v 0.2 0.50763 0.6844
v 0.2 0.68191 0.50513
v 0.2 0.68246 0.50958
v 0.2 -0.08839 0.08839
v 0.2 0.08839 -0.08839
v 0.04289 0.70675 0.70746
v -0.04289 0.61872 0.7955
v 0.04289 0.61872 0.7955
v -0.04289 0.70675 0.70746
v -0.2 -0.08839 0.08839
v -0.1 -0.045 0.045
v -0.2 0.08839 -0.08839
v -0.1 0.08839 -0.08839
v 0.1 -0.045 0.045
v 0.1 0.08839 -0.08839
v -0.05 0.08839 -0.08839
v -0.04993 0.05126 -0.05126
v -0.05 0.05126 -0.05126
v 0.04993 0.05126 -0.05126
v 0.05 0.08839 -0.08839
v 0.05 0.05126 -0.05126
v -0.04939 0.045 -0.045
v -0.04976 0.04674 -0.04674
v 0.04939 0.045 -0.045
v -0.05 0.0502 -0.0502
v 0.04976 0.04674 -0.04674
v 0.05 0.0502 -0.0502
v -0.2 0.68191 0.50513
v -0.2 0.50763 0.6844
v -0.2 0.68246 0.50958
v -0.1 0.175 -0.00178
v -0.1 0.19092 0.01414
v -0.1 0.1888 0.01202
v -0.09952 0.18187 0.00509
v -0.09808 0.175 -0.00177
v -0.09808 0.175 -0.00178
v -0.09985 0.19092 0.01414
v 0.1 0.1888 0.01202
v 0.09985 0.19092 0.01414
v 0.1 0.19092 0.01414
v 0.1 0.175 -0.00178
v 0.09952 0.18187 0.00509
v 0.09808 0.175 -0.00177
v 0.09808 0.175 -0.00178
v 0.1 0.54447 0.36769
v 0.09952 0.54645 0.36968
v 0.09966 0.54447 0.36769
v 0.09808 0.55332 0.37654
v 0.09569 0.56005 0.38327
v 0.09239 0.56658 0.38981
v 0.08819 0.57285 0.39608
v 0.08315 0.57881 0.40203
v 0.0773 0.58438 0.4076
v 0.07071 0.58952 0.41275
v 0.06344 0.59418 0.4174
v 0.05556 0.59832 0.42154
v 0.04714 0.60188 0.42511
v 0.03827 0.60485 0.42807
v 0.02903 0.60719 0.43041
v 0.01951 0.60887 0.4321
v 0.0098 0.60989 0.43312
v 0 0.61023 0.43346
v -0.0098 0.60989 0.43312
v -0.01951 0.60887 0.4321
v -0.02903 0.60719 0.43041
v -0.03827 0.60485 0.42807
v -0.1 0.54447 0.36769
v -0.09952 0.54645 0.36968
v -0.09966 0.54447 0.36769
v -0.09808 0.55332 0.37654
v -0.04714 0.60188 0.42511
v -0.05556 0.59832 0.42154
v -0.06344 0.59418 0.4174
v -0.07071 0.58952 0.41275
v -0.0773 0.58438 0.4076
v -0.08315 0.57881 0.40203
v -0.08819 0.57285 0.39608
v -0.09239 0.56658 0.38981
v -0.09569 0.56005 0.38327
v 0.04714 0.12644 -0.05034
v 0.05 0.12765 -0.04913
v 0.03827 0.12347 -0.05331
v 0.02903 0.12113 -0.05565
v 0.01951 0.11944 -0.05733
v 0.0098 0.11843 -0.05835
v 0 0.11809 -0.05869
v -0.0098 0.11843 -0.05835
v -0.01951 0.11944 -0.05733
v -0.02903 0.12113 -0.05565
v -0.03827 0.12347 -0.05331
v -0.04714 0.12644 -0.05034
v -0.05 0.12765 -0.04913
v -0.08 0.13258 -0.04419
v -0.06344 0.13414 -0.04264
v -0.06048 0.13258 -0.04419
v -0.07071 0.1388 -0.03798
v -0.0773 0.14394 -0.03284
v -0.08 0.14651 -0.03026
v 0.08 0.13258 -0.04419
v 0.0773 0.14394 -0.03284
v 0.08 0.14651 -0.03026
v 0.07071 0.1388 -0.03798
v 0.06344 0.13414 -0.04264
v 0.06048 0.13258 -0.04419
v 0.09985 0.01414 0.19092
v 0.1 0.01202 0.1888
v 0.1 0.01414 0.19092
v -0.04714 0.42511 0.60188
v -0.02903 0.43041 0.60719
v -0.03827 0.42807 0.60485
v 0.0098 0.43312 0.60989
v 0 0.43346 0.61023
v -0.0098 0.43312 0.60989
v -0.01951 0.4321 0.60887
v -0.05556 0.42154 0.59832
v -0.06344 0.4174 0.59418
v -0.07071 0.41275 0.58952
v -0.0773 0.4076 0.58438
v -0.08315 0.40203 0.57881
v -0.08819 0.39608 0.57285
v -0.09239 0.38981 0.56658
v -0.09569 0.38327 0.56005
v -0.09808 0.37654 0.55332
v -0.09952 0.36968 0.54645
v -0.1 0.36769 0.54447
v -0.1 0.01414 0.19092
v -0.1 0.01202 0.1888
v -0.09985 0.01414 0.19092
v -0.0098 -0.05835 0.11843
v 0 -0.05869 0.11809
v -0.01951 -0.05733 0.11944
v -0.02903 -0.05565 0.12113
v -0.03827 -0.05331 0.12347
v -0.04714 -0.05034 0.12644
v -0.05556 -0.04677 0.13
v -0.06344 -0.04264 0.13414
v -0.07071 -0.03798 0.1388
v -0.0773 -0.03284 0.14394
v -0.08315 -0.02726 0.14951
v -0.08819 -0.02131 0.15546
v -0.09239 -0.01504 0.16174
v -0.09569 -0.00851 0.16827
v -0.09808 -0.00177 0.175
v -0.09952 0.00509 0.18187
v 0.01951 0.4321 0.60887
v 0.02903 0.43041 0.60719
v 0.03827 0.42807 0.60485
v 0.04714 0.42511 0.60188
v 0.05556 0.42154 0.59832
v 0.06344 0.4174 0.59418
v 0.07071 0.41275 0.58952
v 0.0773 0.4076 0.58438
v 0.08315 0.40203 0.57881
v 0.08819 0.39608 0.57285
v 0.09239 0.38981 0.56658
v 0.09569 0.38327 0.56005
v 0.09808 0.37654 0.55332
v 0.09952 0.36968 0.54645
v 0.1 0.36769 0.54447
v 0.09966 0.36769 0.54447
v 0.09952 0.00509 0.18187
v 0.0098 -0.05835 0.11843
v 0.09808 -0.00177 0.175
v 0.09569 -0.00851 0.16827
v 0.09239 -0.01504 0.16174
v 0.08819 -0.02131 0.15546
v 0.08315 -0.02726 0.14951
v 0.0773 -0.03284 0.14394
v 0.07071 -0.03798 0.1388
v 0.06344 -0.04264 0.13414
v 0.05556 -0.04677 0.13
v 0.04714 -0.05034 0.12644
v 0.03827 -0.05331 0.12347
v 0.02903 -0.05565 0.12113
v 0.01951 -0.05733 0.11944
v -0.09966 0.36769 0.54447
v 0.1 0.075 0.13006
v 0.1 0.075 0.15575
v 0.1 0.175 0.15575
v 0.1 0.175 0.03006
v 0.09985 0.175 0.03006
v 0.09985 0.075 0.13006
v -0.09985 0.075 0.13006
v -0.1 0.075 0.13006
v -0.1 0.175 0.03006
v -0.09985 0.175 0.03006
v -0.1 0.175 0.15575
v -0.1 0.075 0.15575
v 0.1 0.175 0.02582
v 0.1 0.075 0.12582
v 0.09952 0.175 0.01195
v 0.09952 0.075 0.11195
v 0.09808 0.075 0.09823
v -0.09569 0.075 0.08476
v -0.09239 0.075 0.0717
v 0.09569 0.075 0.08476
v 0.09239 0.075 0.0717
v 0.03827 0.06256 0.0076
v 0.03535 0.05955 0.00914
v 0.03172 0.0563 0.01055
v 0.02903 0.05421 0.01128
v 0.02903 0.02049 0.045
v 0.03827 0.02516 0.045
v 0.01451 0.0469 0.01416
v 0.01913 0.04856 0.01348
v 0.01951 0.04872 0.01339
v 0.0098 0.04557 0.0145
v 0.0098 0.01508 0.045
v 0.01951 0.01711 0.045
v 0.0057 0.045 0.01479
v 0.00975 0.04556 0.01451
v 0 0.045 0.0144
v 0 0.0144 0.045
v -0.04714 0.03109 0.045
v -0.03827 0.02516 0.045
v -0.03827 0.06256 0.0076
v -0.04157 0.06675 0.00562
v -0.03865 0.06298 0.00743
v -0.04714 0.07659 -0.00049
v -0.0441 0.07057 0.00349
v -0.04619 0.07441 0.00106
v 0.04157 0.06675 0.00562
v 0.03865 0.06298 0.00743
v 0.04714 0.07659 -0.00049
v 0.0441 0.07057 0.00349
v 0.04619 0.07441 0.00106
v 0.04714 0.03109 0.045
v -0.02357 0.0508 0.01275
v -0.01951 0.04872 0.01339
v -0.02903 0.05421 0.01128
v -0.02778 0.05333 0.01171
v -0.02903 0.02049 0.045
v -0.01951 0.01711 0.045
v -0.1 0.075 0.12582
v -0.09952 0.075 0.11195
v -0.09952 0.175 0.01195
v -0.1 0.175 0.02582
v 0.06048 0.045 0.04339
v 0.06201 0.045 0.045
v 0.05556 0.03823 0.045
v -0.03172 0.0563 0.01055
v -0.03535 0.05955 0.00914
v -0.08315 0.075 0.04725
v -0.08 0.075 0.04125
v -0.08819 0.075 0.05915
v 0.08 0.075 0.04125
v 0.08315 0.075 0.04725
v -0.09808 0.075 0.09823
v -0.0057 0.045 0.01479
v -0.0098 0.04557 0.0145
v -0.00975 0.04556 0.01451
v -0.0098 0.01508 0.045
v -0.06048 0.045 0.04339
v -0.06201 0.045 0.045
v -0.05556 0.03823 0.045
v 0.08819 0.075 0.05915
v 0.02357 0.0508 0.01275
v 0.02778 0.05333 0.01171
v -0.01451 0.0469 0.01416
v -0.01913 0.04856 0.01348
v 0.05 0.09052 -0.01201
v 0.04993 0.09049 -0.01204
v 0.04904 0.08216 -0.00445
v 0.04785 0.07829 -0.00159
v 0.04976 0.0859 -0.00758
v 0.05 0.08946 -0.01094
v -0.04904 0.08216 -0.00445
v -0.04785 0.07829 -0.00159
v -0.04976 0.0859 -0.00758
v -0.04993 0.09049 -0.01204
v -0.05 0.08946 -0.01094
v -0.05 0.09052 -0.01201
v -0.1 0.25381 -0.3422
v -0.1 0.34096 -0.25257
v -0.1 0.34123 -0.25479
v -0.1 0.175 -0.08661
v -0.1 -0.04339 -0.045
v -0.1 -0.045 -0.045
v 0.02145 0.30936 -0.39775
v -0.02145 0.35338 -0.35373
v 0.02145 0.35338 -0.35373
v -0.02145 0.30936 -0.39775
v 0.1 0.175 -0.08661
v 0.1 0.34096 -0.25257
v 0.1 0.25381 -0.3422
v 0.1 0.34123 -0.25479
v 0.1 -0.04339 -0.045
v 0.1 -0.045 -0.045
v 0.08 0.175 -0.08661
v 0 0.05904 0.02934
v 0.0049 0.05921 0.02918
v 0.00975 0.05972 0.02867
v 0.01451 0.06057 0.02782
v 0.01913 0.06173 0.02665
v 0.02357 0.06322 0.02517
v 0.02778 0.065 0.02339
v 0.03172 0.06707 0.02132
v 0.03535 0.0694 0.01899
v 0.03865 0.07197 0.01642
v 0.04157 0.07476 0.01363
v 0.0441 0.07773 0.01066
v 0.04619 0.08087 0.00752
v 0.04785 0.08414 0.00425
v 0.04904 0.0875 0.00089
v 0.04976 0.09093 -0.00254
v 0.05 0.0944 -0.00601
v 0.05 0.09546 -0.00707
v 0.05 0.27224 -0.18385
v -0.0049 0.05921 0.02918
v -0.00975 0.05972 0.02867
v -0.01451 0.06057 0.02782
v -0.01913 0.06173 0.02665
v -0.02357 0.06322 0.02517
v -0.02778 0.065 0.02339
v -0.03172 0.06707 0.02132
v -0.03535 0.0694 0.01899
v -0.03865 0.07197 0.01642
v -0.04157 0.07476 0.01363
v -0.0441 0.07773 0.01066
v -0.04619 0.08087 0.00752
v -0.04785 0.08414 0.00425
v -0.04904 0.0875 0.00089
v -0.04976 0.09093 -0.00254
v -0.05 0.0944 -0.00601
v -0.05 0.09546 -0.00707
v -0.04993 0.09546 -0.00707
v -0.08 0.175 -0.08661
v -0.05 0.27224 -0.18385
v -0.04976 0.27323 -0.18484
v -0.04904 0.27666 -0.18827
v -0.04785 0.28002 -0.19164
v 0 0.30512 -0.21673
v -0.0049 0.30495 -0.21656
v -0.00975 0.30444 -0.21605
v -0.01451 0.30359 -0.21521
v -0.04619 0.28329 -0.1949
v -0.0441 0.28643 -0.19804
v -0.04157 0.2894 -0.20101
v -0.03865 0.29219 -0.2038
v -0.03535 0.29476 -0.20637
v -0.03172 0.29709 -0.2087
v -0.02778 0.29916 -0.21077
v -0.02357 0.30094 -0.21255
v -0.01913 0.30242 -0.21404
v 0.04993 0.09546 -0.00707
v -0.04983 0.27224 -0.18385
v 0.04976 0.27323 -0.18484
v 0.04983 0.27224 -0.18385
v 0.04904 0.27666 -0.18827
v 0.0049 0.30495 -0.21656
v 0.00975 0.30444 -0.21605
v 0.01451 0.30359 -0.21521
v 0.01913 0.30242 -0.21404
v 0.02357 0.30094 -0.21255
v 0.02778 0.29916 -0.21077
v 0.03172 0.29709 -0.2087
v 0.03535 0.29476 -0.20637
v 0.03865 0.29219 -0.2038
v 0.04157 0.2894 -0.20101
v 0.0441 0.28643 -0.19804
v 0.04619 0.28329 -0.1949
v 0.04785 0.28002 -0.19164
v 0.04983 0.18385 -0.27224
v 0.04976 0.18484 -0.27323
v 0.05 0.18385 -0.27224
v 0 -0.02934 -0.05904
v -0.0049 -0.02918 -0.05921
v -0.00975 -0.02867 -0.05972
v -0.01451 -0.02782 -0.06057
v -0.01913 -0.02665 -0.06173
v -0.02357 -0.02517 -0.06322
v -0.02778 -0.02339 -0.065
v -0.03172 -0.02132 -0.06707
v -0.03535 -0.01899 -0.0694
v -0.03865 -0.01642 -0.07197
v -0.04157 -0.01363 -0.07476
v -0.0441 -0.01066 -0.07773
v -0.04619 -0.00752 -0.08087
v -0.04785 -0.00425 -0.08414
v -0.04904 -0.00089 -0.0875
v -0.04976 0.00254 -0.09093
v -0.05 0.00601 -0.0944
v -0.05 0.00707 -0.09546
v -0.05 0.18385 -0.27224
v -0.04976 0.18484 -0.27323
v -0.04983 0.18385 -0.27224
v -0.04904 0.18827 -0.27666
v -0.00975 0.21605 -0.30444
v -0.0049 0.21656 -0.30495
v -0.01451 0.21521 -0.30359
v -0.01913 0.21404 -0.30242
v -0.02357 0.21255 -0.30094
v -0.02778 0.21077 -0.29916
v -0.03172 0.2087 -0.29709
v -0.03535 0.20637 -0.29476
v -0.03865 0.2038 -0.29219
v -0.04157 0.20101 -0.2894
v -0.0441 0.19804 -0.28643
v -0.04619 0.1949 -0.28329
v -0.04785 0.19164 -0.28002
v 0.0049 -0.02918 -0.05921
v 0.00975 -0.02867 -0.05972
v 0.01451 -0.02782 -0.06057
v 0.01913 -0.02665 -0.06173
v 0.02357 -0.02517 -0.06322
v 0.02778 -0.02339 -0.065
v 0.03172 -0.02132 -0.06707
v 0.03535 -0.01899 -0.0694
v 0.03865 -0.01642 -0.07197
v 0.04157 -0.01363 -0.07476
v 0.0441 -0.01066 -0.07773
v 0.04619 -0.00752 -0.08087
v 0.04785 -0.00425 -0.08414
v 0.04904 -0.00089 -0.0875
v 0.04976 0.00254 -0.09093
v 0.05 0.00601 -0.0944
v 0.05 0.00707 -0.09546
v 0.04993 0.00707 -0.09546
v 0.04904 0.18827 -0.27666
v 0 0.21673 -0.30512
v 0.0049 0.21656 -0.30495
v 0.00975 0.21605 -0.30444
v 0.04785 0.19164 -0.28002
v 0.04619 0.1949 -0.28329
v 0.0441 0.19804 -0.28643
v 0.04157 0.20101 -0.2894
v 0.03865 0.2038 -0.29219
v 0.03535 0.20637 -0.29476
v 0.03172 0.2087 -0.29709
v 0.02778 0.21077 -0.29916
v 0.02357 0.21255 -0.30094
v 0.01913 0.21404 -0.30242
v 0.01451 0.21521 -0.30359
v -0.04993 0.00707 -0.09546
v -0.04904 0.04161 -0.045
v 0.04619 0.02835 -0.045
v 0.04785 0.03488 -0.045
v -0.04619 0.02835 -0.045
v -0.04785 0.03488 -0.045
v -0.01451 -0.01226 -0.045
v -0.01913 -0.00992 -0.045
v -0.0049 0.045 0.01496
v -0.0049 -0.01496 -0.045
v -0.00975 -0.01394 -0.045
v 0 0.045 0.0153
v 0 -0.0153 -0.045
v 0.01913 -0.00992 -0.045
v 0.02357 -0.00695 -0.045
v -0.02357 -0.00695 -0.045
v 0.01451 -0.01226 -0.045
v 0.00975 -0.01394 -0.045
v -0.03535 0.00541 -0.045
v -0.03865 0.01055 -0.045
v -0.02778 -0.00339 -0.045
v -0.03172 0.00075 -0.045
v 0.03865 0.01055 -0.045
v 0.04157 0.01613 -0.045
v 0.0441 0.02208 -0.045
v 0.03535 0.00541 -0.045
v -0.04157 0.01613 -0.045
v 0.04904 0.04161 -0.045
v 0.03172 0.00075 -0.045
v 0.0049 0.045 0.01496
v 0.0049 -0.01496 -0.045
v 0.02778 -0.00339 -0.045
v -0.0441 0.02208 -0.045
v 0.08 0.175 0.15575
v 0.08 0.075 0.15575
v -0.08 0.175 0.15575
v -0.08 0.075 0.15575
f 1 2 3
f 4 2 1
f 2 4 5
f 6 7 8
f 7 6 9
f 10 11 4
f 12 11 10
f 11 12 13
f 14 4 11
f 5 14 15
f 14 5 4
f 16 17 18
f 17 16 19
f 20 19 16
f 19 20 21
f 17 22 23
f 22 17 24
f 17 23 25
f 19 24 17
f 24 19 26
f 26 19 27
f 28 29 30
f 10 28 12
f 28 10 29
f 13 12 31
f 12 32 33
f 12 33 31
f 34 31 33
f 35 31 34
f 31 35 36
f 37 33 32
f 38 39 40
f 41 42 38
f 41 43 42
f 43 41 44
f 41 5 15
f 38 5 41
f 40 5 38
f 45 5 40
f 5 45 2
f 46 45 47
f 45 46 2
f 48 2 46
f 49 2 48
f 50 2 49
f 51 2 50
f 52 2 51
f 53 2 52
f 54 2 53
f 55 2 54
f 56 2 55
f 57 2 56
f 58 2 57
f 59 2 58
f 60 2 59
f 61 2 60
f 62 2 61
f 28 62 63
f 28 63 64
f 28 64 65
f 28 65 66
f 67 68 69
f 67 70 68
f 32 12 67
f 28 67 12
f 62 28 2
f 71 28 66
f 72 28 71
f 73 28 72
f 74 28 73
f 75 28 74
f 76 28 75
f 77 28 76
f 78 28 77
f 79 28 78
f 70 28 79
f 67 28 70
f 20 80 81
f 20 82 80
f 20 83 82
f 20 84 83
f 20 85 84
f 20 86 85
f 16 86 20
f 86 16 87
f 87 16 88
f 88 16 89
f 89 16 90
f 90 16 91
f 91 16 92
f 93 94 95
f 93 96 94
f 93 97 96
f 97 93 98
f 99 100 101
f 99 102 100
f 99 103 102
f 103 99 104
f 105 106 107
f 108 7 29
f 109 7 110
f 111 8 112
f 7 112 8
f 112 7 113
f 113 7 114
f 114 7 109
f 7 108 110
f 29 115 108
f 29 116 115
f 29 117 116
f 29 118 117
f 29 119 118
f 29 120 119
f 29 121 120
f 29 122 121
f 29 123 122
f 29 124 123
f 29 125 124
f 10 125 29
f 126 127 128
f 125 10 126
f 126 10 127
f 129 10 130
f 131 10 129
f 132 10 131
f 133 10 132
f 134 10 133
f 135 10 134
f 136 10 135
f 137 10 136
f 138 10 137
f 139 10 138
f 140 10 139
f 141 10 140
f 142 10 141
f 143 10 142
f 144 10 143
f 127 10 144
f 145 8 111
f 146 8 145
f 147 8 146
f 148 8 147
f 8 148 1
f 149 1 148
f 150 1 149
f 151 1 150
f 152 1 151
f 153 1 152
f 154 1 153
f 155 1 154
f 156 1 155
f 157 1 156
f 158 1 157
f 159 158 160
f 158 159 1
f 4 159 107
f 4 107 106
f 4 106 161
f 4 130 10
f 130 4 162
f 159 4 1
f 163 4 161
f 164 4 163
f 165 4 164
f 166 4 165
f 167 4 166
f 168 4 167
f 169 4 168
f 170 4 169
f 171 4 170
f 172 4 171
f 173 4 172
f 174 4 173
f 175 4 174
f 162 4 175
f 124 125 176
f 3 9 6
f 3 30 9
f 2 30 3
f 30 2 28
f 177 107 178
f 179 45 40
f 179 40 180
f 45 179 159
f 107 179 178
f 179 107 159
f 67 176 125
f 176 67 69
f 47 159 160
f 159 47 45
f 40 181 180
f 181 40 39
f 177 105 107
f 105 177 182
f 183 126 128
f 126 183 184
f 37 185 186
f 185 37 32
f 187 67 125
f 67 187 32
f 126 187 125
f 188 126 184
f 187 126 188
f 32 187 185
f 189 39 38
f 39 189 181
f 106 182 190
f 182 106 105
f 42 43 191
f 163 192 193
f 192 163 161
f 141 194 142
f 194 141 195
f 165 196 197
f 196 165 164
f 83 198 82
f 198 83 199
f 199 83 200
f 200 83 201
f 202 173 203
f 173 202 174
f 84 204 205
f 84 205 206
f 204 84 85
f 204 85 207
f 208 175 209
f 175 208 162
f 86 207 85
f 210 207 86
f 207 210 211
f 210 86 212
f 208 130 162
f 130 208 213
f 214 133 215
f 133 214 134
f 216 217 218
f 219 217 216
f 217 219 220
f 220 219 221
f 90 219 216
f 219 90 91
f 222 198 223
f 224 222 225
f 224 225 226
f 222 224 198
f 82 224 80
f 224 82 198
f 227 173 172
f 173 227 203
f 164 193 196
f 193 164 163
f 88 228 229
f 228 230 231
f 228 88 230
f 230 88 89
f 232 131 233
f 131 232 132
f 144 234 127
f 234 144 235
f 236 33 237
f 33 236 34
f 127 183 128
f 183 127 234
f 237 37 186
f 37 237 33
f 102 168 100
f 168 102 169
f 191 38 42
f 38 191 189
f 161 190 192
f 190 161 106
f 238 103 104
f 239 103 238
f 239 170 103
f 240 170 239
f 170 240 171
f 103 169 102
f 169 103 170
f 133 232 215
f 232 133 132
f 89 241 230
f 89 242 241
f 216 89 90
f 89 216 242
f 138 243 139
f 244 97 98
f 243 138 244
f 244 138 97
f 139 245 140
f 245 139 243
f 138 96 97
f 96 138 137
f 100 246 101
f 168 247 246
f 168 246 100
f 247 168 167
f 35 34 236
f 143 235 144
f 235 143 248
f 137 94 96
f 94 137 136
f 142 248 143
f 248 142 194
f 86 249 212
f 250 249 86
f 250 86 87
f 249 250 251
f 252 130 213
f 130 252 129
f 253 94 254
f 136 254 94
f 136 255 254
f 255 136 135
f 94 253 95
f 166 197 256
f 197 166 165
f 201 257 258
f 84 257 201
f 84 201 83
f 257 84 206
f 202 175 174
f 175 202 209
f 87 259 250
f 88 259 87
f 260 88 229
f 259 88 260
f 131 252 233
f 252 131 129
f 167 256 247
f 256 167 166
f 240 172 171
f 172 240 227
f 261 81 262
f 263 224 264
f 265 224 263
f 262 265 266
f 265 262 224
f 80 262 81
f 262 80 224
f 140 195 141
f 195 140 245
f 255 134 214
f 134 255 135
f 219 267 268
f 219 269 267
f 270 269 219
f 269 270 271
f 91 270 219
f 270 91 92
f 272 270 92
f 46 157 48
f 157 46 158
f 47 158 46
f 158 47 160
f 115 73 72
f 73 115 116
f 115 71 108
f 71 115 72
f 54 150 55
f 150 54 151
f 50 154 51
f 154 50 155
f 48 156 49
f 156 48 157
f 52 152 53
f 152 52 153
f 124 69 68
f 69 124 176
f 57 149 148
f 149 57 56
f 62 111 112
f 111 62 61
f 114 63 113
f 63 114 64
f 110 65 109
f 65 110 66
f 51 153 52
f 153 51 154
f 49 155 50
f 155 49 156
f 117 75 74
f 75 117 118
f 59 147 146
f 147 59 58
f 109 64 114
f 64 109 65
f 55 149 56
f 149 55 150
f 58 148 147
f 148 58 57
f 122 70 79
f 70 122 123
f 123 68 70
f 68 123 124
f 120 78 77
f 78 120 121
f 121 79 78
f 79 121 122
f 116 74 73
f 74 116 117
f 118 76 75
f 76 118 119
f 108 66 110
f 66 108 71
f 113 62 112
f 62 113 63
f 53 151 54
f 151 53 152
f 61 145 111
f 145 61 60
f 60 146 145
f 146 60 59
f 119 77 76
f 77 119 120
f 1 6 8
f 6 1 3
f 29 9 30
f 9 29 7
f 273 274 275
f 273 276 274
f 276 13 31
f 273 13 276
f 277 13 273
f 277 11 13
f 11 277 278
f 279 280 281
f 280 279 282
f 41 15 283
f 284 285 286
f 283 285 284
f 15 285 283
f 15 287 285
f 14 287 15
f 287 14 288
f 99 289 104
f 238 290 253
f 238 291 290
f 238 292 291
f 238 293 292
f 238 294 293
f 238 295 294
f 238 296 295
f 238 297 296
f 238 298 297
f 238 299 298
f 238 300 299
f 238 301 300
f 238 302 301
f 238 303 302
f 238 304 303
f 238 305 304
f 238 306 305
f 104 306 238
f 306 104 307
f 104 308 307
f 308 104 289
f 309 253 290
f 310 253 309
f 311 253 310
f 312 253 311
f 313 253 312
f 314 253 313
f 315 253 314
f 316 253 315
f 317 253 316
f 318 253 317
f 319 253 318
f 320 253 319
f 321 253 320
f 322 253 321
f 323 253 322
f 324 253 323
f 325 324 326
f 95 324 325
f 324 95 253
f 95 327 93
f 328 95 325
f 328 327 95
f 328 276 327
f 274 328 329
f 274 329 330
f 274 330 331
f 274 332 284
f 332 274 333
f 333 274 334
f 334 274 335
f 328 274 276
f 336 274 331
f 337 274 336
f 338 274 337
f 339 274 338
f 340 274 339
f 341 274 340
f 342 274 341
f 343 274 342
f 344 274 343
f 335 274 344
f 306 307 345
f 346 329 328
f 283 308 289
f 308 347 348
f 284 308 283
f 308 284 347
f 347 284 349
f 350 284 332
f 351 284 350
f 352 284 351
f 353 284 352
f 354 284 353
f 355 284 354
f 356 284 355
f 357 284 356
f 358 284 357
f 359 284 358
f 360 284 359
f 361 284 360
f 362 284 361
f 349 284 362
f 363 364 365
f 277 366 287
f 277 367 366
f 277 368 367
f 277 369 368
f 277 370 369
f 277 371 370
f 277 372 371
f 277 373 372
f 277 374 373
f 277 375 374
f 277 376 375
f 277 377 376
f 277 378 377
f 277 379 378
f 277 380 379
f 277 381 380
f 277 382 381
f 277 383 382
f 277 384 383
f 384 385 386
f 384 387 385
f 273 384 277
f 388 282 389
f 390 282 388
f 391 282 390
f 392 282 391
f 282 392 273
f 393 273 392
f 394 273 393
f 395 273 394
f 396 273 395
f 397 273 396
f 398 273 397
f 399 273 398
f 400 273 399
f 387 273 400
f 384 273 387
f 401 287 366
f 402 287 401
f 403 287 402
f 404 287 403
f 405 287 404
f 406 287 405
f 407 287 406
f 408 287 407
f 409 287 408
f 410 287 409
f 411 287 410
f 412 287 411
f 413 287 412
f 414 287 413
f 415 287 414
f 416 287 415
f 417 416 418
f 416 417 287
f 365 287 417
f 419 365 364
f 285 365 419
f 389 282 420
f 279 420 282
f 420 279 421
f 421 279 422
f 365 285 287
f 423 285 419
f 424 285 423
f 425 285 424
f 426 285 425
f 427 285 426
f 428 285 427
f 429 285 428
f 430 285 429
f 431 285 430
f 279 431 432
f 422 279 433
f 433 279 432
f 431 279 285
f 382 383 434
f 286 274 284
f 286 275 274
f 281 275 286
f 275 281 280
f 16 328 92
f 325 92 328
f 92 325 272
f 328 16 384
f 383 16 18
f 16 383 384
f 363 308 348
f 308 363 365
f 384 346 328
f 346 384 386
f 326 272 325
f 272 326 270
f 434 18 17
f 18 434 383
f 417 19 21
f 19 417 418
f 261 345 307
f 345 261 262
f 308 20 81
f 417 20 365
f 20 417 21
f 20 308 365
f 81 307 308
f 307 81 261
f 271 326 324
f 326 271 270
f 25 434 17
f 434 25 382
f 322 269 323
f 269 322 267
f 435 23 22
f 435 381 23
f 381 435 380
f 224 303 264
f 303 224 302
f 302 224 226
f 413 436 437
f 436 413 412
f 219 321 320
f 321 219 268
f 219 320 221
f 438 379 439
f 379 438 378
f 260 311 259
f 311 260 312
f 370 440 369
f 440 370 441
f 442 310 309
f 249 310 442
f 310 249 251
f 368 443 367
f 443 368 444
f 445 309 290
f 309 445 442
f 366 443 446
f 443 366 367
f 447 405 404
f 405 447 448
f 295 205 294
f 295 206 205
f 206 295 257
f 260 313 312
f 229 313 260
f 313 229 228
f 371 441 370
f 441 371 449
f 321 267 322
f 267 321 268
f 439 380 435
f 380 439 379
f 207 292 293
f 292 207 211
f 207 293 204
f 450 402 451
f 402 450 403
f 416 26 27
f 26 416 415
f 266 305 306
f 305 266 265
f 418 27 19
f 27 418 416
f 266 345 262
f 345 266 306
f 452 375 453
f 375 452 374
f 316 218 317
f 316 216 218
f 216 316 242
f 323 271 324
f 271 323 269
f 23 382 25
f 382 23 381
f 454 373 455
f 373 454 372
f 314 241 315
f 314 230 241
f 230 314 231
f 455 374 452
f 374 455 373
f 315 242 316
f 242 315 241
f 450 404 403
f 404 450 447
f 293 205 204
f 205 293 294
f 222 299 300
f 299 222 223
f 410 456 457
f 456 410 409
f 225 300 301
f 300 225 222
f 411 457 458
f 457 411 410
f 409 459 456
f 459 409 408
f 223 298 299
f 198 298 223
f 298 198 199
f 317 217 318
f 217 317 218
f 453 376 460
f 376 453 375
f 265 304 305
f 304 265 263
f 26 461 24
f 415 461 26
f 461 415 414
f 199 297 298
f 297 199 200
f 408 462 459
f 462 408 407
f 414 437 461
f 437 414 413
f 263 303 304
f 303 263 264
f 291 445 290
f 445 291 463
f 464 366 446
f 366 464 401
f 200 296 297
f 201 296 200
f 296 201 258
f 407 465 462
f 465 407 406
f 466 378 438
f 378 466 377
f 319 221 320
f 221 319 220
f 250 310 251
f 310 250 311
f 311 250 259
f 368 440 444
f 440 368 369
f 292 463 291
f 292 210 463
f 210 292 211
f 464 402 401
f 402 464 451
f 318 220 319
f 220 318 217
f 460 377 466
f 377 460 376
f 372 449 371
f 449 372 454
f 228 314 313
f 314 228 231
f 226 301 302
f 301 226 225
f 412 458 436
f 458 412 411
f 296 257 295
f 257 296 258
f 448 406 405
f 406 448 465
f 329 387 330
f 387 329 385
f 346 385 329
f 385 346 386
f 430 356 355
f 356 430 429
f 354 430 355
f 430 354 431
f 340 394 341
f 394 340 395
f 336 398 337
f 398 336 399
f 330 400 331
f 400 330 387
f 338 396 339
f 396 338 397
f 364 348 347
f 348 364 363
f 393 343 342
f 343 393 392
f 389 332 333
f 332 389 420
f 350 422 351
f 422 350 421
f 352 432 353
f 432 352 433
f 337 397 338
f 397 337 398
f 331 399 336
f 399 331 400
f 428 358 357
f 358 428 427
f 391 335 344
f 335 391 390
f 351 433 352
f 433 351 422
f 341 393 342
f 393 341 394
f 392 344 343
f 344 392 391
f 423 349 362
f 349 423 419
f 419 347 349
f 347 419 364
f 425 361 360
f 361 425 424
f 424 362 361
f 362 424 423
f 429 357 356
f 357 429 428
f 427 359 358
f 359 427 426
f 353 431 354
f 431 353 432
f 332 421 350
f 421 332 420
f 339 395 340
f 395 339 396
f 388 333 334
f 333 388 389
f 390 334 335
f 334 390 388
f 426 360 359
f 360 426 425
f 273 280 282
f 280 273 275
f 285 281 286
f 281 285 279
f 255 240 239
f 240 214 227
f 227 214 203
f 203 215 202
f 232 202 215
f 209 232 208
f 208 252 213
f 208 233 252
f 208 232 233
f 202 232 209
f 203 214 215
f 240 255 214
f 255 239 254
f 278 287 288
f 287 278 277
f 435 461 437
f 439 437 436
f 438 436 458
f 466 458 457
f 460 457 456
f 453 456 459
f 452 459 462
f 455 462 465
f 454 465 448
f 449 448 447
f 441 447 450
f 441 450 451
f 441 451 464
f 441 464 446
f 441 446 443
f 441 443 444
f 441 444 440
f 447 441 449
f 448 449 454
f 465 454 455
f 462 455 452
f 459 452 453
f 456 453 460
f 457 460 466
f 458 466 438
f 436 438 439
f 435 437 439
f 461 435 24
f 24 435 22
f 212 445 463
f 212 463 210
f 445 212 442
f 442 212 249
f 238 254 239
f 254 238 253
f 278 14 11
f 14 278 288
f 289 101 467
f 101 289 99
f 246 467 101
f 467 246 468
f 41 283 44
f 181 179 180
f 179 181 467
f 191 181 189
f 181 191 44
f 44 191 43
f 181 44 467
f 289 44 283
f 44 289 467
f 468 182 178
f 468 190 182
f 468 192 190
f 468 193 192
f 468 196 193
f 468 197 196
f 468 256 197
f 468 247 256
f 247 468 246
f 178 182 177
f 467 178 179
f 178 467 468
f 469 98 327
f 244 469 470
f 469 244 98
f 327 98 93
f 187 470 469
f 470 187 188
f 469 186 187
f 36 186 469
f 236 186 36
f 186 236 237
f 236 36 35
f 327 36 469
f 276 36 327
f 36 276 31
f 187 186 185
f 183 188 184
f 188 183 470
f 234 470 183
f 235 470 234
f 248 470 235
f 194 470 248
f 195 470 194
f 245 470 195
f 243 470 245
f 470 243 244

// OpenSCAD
// file: Robot_Body_008.scad
// ----------------------------------------------------------------------------------------------------
// PROJECT INFORMATION

// NAME:  Robot Body
// REVISION:  A1
// START DATE:  7/4/2023
// CURRENT VERSION DATE:  7/12/2023
// LICENSE:  GPLv3
// AUTHOR:  Justin Grimes (@zelon88)
// DESCRIPTION:  A body for tracked robot.
// ----------------------------------------------------------------------------------------------------

// ----------------------------------------------------------------------------------------------------
// PART INFORMATION

// NAME:  Robot Body Fastener Half
// REVISION:  A1
// START DATE:  7/11/2023
// CURRENT VERSION DATE:  7/12/2023
// AUTHOR:  Justin Grimes (@zelon88)
// DESCRIPTION:  
//    A fastener for joining body panels together.
//    The purpose of this part is to modularize the design of body fasteners.
//    This part does not need to be printed.
// FILE NAME: Robot_Body_008.scad
// ----------------------------------------------------------------------------------------------------

// ----------------------------------------------------------------------------------------------------
// PRINTER CONFIGURATION

// ----------------------------------------------------------------------------------------------------

// ----------------------------------------------------------------------------------------------------
// MANUFACTURING INSTRUCTIONS

// ----------------------------------------------------------------------------------------------------

// ----------------------------------------------------------------------------------------------------
// MODULES

// ----------------------------------------------------------------------------------------------------

// ----------------------------------------------------------------------------------------------------
// GEOMETRY

// 45 Degree Body Fastener.
difference() { 
  // Body of Fastener.
  translate([0, 0, 0.25]) cube([0.2, 0.125, 0.5], center=true);

  // Tapered Edge.
  translate([0, 0.04, 0.55]) rotate([38, 0, 0]) cube([0.5, 0.125, .5], center=true);

  // Upper Slot.
  translate([0, 0, 0.1975]) cube([0.1, 0.125, .25], center=true);

  // Inner Radius of Slot.
  translate([0, 0, 0.071]) rotate([90, 0, 0]) cylinder(r=0.05, h=0.125, $fn=64, center=true);

  // Outer Radius of Slot.
  translate([0, 0, 0.319]) rotate([90, 0, 0]) cylinder(r=0.05, h=0.125, $fn=64, center=true);

  // Edge Chamfers.
  translate([0.3125, 0, 0.5625]) rotate([0, 45, 0]) cube([0.5, 0.5, 0.5], center=true);
  translate([-0.3125, 0, 0.5625]) rotate([0, 45, 0]) cube([0.5, 0.5, 0.5], center=true); }
// ----------------------------------------------------------------------------------------------------
// file: Robot_Body_011.scad
// ----------------------------------------------------------------------------------------------------
// PROJECT INFORMATION

// NAME:  Robot Body
// REVISION:  A1
// START DATE:  7/4/2023
// CURRENT VERSION DATE:  7/12/2023
// LICENSE:  GPLv3
// AUTHOR:  Justin Grimes (@zelon88)
// DESCRIPTION:  A body for tracked robot.
// ----------------------------------------------------------------------------------------------------

// ----------------------------------------------------------------------------------------------------
// PART INFORMATION

// NAME:  Robot Body 90 Degree Fastener
// REVISION:  A1
// START DATE:  7/11/2023
// CURRENT VERSION DATE:  7/12/2023
// AUTHOR:  Justin Grimes (@zelon88)
// DESCRIPTION:  
//    A fastener for joining body panels together.
// FILE NAME: Robot_Body_011.scad
// ----------------------------------------------------------------------------------------------------

// ----------------------------------------------------------------------------------------------------
// PRINTER CONFIGURATION

// ----------------------------------------------------------------------------------------------------

// ----------------------------------------------------------------------------------------------------
// MANUFACTURING INSTRUCTIONS

// ----------------------------------------------------------------------------------------------------

// ----------------------------------------------------------------------------------------------------
// MODULES

// ----------------------------------------------------------------------------------------------------

// ----------------------------------------------------------------------------------------------------
// GEOMETRY

// 90 Degree Body Fastener.

// Load the modular fastner portion "Robot_Body_008.scad" and rotate it.
rotate([-45, 000, 0]) include <Robot_Body_008.scad>;
rotate([-45, 180, 0]) include <Robot_Body_008.scad>;

// Fill In The Center Gap.
cube([0.2, 0.09, 0.09], center=true);

// Add side Reinforcements.
translate([0.09, 0.125, -0.037]) rotate([0, 0, 0]) cube([0.02, 0.1, 0.2375], center=true);
translate([0.09, 0.125, 0.037]) rotate([0, 0, 0]) cube([0.02, 0.1, 0.2375], center=true);
translate([-0.09, 0.125, 0.037]) rotate([0, 0, 0]) cube([0.02, 0.1, 0.2375], center=true);
translate([-0.09, 0.125, -0.037]) rotate([0, 0, 0]) cube([0.02, 0.1, 0.2375], center=true);
// ----------------------------------------------------------------------------------------------------
// main file
// ----------------------------------------------------------------------------------------------------
// PROJECT INFORMATION

// NAME:  Robot Body
// REVISION:  A1
// START DATE:  7/4/2023
// CURRENT VERSION DATE:  7/12/2023
// LICENSE:  GPLv3
// AUTHOR:  Justin Grimes (@zelon88)
// DESCRIPTION:  A body for tracked robot.
// ----------------------------------------------------------------------------------------------------

// ----------------------------------------------------------------------------------------------------
// PART INFORMATION

// NAME:  Robot Body Large 90 Degree Fastener
// REVISION:  A1
// START DATE:  7/12/2023
// CURRENT VERSION DATE:  7/12/2023
// AUTHOR:  Justin Grimes (@zelon88)
// DESCRIPTION:  
//    A fastener for joining body panels together.
// FILE NAME: Robot_Body_015.scad
// ----------------------------------------------------------------------------------------------------

// ----------------------------------------------------------------------------------------------------
// PRINTER CONFIGURATION

// ----------------------------------------------------------------------------------------------------

// ----------------------------------------------------------------------------------------------------
// MANUFACTURING INSTRUCTIONS

// ----------------------------------------------------------------------------------------------------

// ----------------------------------------------------------------------------------------------------
// MODULES

// ----------------------------------------------------------------------------------------------------

// ----------------------------------------------------------------------------------------------------
// GEOMETRY

// 90 Degree Body Fastener.

// Load the standard 90 Degree Fastner portion "Robot_Body_011.scad" and scale it up.
scale([2, 2, 2]) include <Robot_Body_011.scad>;
// ----------------------------------------------------------------------------------------------------
